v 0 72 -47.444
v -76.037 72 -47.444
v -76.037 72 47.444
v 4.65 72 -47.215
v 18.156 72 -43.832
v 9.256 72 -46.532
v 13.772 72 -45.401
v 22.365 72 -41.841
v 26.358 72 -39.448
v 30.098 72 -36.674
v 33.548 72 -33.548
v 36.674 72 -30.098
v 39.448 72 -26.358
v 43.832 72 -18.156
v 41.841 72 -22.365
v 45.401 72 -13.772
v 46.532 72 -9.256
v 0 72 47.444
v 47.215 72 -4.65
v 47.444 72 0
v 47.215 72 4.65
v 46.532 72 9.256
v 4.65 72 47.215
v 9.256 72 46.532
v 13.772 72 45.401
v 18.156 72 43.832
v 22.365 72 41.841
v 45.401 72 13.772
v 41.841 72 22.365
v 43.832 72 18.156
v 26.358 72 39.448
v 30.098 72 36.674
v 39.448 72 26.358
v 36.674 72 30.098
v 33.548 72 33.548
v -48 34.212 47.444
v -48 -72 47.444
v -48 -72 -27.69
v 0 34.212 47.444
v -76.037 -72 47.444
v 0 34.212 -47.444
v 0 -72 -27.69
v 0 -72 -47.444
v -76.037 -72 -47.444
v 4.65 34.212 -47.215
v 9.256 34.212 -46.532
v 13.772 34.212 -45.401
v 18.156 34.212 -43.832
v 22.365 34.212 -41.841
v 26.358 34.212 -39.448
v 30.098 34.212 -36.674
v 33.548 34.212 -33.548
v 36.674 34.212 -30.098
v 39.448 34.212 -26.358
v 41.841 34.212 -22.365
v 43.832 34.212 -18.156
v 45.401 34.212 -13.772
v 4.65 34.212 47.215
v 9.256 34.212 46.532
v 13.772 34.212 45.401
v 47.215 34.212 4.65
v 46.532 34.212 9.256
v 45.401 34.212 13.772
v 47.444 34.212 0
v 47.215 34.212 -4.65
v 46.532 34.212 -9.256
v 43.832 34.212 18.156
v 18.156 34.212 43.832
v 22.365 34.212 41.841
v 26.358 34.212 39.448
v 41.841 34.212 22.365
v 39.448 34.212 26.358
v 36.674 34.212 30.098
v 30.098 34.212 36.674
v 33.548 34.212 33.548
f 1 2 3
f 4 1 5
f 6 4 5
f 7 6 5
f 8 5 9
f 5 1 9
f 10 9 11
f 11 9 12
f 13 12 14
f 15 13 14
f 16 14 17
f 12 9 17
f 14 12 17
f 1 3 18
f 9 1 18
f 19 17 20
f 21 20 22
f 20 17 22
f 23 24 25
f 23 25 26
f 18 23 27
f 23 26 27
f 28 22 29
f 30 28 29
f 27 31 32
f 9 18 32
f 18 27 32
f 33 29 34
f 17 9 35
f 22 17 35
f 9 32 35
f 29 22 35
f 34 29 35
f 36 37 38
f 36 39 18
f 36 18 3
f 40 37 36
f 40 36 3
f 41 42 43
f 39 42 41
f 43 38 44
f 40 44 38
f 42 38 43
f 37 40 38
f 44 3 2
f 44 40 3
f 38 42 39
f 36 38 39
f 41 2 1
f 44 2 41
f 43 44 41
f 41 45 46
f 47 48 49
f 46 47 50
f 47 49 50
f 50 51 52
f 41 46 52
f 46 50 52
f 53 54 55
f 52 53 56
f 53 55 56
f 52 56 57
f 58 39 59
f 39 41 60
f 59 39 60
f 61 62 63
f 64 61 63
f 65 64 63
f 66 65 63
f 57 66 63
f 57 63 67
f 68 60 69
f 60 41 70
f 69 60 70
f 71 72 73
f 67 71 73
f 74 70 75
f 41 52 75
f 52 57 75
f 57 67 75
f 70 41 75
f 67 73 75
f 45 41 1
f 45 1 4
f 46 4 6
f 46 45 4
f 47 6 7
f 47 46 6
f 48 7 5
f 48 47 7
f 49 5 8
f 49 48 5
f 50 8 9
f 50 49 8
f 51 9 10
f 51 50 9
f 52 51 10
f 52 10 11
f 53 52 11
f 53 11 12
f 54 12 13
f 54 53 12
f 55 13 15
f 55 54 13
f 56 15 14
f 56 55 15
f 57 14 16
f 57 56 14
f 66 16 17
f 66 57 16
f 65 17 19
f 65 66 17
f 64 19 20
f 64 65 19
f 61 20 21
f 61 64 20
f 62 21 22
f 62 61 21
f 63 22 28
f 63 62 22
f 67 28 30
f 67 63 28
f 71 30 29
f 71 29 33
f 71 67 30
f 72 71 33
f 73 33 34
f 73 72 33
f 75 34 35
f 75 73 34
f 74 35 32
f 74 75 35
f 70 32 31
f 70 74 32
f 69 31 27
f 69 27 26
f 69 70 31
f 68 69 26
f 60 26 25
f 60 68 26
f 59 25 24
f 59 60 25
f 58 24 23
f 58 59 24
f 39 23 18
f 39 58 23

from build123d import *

# Parameters (mm, degrees)
F1_DEPTH = 72
F4_W     = 106.2124588788
F4_H     = 94.8871162292
F5_DEPTH = 47.4435581146
F7_DEPTH = 48


with BuildPart() as f1:
    # F0 (on Front) → F1 (new body, symmetric)
    with BuildSketch(Plane.XZ):
        with BuildLine():
            Line((-76.0368704796, -47.4435581146), (0, -47.4435581146))
            ThreePointArc((0, -47.4435581146), (47.4435581146, 0), (0, 47.4435581146))
            Line((0, 47.4435581146), (-76.0368704796, 47.4435581146))
            Line((-76.0368704796, 47.4435581146), (-76.0368704796, -47.4435581146))
        make_face()
    extrude(amount=F1_DEPTH, both=True)

    # F4 (on plane+point) → F5 (cut, through all)
    with BuildSketch(Plane.YZ.offset(47.4435581146)):
        with Locations((-18.8937705606, 0)):
            Rectangle(F4_W, F4_H)
    extrude(amount=-F5_DEPTH, mode=Mode.SUBTRACT)

    # F6 (on face) → F7 (cut)
    with BuildSketch(Plane.YZ):
        Polygon((-72, -27.6897922158), (34.2124588788, 47.4435581146), (-72, 47.4435581146), align=None)
    extrude(amount=-F7_DEPTH, mode=Mode.SUBTRACT)


solid = f1.part
